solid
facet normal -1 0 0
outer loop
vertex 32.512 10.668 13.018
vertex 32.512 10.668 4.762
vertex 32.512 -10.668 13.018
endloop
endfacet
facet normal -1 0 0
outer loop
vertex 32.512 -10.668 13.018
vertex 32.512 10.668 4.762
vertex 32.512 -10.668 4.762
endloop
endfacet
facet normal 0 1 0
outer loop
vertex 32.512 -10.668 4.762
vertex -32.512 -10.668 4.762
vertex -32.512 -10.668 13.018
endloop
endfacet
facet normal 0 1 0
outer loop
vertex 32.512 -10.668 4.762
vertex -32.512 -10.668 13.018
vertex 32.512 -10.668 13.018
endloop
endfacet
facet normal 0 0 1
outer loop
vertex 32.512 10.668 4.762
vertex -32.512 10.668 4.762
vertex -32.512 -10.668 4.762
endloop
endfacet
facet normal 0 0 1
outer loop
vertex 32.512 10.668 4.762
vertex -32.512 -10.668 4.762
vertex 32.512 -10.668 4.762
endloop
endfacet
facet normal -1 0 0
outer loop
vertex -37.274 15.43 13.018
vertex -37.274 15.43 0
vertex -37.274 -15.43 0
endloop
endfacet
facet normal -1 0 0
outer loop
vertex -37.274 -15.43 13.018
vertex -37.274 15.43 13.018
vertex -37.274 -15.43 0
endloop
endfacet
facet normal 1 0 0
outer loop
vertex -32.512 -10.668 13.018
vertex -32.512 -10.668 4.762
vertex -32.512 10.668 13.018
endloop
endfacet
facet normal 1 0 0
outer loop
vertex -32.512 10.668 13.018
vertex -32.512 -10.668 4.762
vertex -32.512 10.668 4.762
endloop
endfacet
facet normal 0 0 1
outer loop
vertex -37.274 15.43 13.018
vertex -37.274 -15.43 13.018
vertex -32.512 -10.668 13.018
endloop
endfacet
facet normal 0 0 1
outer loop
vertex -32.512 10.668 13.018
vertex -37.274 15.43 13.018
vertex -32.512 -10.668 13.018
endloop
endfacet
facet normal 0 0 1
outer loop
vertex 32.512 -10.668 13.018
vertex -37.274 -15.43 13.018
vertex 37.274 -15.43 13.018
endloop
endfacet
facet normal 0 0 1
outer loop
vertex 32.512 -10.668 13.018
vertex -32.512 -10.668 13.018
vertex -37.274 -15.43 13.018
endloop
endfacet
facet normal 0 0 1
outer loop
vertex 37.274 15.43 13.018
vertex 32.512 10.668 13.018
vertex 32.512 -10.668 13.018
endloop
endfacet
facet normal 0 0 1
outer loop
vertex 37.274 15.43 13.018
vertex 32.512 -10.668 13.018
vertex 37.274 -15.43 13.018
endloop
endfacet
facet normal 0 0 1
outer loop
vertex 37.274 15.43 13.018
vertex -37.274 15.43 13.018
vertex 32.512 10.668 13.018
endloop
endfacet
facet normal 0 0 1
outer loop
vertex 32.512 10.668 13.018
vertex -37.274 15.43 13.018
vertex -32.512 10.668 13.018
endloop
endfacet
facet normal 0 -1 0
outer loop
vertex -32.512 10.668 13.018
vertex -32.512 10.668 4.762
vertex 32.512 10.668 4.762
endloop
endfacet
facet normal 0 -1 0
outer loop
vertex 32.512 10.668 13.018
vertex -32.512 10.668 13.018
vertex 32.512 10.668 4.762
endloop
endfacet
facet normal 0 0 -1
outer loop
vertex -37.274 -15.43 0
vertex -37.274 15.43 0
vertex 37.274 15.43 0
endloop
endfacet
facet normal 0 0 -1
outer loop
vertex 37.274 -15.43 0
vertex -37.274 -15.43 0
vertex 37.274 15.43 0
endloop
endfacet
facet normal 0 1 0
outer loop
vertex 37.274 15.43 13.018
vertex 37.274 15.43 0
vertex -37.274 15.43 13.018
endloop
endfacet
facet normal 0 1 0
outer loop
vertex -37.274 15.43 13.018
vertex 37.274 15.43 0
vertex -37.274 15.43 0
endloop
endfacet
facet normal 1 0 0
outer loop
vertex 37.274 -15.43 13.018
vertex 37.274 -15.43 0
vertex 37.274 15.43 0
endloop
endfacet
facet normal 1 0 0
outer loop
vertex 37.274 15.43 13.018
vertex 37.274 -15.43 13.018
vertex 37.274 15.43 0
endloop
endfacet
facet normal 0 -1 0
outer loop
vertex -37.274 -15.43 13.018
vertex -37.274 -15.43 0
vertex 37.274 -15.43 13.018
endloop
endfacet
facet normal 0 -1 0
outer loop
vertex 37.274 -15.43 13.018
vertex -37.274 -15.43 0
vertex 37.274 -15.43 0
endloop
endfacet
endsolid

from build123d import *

# Parameters (mm, degrees)
F1_W     = 65.024
F1_H     = 21.336
F2_DEPTH = 4.7625
F1_H_2   = 4.7625
F3_DEPTH = 13.0175


# Not quite as in the source:
# - a variable given as a bare number and used for a length is read in inches; the dataset says mm whatever the document's units were


with BuildPart() as f2:
    # F1 (on Top) → F2 (new body)
    with BuildSketch(Plane.XY):
        Rectangle(F1_W, F1_H)
    extrude(amount=F2_DEPTH)

    # F1 (on Top) → F3 (join)
    with BuildSketch(Plane.XY):
        Polygon((37.2745, 15.4305), (-37.2745, 15.4305), (-37.2745, 10.668), (-32.512, 10.668), (32.512, 10.668), (37.2745, 10.668), align=None)
        Polygon((37.2745, -15.4305), (37.2745, 10.668), (32.512, 10.668), (32.512, -10.668), (32.512, -15.4305), align=None)
        with Locations((0, -13.04925)):
            Rectangle(F1_W, F1_H_2)
        Polygon((-32.512, 10.668), (-37.2745, 10.668), (-37.2745, -15.4305), (-32.512, -15.4305), (-32.512, -10.668), align=None)
    extrude(amount=F3_DEPTH)


solid = f2.part
